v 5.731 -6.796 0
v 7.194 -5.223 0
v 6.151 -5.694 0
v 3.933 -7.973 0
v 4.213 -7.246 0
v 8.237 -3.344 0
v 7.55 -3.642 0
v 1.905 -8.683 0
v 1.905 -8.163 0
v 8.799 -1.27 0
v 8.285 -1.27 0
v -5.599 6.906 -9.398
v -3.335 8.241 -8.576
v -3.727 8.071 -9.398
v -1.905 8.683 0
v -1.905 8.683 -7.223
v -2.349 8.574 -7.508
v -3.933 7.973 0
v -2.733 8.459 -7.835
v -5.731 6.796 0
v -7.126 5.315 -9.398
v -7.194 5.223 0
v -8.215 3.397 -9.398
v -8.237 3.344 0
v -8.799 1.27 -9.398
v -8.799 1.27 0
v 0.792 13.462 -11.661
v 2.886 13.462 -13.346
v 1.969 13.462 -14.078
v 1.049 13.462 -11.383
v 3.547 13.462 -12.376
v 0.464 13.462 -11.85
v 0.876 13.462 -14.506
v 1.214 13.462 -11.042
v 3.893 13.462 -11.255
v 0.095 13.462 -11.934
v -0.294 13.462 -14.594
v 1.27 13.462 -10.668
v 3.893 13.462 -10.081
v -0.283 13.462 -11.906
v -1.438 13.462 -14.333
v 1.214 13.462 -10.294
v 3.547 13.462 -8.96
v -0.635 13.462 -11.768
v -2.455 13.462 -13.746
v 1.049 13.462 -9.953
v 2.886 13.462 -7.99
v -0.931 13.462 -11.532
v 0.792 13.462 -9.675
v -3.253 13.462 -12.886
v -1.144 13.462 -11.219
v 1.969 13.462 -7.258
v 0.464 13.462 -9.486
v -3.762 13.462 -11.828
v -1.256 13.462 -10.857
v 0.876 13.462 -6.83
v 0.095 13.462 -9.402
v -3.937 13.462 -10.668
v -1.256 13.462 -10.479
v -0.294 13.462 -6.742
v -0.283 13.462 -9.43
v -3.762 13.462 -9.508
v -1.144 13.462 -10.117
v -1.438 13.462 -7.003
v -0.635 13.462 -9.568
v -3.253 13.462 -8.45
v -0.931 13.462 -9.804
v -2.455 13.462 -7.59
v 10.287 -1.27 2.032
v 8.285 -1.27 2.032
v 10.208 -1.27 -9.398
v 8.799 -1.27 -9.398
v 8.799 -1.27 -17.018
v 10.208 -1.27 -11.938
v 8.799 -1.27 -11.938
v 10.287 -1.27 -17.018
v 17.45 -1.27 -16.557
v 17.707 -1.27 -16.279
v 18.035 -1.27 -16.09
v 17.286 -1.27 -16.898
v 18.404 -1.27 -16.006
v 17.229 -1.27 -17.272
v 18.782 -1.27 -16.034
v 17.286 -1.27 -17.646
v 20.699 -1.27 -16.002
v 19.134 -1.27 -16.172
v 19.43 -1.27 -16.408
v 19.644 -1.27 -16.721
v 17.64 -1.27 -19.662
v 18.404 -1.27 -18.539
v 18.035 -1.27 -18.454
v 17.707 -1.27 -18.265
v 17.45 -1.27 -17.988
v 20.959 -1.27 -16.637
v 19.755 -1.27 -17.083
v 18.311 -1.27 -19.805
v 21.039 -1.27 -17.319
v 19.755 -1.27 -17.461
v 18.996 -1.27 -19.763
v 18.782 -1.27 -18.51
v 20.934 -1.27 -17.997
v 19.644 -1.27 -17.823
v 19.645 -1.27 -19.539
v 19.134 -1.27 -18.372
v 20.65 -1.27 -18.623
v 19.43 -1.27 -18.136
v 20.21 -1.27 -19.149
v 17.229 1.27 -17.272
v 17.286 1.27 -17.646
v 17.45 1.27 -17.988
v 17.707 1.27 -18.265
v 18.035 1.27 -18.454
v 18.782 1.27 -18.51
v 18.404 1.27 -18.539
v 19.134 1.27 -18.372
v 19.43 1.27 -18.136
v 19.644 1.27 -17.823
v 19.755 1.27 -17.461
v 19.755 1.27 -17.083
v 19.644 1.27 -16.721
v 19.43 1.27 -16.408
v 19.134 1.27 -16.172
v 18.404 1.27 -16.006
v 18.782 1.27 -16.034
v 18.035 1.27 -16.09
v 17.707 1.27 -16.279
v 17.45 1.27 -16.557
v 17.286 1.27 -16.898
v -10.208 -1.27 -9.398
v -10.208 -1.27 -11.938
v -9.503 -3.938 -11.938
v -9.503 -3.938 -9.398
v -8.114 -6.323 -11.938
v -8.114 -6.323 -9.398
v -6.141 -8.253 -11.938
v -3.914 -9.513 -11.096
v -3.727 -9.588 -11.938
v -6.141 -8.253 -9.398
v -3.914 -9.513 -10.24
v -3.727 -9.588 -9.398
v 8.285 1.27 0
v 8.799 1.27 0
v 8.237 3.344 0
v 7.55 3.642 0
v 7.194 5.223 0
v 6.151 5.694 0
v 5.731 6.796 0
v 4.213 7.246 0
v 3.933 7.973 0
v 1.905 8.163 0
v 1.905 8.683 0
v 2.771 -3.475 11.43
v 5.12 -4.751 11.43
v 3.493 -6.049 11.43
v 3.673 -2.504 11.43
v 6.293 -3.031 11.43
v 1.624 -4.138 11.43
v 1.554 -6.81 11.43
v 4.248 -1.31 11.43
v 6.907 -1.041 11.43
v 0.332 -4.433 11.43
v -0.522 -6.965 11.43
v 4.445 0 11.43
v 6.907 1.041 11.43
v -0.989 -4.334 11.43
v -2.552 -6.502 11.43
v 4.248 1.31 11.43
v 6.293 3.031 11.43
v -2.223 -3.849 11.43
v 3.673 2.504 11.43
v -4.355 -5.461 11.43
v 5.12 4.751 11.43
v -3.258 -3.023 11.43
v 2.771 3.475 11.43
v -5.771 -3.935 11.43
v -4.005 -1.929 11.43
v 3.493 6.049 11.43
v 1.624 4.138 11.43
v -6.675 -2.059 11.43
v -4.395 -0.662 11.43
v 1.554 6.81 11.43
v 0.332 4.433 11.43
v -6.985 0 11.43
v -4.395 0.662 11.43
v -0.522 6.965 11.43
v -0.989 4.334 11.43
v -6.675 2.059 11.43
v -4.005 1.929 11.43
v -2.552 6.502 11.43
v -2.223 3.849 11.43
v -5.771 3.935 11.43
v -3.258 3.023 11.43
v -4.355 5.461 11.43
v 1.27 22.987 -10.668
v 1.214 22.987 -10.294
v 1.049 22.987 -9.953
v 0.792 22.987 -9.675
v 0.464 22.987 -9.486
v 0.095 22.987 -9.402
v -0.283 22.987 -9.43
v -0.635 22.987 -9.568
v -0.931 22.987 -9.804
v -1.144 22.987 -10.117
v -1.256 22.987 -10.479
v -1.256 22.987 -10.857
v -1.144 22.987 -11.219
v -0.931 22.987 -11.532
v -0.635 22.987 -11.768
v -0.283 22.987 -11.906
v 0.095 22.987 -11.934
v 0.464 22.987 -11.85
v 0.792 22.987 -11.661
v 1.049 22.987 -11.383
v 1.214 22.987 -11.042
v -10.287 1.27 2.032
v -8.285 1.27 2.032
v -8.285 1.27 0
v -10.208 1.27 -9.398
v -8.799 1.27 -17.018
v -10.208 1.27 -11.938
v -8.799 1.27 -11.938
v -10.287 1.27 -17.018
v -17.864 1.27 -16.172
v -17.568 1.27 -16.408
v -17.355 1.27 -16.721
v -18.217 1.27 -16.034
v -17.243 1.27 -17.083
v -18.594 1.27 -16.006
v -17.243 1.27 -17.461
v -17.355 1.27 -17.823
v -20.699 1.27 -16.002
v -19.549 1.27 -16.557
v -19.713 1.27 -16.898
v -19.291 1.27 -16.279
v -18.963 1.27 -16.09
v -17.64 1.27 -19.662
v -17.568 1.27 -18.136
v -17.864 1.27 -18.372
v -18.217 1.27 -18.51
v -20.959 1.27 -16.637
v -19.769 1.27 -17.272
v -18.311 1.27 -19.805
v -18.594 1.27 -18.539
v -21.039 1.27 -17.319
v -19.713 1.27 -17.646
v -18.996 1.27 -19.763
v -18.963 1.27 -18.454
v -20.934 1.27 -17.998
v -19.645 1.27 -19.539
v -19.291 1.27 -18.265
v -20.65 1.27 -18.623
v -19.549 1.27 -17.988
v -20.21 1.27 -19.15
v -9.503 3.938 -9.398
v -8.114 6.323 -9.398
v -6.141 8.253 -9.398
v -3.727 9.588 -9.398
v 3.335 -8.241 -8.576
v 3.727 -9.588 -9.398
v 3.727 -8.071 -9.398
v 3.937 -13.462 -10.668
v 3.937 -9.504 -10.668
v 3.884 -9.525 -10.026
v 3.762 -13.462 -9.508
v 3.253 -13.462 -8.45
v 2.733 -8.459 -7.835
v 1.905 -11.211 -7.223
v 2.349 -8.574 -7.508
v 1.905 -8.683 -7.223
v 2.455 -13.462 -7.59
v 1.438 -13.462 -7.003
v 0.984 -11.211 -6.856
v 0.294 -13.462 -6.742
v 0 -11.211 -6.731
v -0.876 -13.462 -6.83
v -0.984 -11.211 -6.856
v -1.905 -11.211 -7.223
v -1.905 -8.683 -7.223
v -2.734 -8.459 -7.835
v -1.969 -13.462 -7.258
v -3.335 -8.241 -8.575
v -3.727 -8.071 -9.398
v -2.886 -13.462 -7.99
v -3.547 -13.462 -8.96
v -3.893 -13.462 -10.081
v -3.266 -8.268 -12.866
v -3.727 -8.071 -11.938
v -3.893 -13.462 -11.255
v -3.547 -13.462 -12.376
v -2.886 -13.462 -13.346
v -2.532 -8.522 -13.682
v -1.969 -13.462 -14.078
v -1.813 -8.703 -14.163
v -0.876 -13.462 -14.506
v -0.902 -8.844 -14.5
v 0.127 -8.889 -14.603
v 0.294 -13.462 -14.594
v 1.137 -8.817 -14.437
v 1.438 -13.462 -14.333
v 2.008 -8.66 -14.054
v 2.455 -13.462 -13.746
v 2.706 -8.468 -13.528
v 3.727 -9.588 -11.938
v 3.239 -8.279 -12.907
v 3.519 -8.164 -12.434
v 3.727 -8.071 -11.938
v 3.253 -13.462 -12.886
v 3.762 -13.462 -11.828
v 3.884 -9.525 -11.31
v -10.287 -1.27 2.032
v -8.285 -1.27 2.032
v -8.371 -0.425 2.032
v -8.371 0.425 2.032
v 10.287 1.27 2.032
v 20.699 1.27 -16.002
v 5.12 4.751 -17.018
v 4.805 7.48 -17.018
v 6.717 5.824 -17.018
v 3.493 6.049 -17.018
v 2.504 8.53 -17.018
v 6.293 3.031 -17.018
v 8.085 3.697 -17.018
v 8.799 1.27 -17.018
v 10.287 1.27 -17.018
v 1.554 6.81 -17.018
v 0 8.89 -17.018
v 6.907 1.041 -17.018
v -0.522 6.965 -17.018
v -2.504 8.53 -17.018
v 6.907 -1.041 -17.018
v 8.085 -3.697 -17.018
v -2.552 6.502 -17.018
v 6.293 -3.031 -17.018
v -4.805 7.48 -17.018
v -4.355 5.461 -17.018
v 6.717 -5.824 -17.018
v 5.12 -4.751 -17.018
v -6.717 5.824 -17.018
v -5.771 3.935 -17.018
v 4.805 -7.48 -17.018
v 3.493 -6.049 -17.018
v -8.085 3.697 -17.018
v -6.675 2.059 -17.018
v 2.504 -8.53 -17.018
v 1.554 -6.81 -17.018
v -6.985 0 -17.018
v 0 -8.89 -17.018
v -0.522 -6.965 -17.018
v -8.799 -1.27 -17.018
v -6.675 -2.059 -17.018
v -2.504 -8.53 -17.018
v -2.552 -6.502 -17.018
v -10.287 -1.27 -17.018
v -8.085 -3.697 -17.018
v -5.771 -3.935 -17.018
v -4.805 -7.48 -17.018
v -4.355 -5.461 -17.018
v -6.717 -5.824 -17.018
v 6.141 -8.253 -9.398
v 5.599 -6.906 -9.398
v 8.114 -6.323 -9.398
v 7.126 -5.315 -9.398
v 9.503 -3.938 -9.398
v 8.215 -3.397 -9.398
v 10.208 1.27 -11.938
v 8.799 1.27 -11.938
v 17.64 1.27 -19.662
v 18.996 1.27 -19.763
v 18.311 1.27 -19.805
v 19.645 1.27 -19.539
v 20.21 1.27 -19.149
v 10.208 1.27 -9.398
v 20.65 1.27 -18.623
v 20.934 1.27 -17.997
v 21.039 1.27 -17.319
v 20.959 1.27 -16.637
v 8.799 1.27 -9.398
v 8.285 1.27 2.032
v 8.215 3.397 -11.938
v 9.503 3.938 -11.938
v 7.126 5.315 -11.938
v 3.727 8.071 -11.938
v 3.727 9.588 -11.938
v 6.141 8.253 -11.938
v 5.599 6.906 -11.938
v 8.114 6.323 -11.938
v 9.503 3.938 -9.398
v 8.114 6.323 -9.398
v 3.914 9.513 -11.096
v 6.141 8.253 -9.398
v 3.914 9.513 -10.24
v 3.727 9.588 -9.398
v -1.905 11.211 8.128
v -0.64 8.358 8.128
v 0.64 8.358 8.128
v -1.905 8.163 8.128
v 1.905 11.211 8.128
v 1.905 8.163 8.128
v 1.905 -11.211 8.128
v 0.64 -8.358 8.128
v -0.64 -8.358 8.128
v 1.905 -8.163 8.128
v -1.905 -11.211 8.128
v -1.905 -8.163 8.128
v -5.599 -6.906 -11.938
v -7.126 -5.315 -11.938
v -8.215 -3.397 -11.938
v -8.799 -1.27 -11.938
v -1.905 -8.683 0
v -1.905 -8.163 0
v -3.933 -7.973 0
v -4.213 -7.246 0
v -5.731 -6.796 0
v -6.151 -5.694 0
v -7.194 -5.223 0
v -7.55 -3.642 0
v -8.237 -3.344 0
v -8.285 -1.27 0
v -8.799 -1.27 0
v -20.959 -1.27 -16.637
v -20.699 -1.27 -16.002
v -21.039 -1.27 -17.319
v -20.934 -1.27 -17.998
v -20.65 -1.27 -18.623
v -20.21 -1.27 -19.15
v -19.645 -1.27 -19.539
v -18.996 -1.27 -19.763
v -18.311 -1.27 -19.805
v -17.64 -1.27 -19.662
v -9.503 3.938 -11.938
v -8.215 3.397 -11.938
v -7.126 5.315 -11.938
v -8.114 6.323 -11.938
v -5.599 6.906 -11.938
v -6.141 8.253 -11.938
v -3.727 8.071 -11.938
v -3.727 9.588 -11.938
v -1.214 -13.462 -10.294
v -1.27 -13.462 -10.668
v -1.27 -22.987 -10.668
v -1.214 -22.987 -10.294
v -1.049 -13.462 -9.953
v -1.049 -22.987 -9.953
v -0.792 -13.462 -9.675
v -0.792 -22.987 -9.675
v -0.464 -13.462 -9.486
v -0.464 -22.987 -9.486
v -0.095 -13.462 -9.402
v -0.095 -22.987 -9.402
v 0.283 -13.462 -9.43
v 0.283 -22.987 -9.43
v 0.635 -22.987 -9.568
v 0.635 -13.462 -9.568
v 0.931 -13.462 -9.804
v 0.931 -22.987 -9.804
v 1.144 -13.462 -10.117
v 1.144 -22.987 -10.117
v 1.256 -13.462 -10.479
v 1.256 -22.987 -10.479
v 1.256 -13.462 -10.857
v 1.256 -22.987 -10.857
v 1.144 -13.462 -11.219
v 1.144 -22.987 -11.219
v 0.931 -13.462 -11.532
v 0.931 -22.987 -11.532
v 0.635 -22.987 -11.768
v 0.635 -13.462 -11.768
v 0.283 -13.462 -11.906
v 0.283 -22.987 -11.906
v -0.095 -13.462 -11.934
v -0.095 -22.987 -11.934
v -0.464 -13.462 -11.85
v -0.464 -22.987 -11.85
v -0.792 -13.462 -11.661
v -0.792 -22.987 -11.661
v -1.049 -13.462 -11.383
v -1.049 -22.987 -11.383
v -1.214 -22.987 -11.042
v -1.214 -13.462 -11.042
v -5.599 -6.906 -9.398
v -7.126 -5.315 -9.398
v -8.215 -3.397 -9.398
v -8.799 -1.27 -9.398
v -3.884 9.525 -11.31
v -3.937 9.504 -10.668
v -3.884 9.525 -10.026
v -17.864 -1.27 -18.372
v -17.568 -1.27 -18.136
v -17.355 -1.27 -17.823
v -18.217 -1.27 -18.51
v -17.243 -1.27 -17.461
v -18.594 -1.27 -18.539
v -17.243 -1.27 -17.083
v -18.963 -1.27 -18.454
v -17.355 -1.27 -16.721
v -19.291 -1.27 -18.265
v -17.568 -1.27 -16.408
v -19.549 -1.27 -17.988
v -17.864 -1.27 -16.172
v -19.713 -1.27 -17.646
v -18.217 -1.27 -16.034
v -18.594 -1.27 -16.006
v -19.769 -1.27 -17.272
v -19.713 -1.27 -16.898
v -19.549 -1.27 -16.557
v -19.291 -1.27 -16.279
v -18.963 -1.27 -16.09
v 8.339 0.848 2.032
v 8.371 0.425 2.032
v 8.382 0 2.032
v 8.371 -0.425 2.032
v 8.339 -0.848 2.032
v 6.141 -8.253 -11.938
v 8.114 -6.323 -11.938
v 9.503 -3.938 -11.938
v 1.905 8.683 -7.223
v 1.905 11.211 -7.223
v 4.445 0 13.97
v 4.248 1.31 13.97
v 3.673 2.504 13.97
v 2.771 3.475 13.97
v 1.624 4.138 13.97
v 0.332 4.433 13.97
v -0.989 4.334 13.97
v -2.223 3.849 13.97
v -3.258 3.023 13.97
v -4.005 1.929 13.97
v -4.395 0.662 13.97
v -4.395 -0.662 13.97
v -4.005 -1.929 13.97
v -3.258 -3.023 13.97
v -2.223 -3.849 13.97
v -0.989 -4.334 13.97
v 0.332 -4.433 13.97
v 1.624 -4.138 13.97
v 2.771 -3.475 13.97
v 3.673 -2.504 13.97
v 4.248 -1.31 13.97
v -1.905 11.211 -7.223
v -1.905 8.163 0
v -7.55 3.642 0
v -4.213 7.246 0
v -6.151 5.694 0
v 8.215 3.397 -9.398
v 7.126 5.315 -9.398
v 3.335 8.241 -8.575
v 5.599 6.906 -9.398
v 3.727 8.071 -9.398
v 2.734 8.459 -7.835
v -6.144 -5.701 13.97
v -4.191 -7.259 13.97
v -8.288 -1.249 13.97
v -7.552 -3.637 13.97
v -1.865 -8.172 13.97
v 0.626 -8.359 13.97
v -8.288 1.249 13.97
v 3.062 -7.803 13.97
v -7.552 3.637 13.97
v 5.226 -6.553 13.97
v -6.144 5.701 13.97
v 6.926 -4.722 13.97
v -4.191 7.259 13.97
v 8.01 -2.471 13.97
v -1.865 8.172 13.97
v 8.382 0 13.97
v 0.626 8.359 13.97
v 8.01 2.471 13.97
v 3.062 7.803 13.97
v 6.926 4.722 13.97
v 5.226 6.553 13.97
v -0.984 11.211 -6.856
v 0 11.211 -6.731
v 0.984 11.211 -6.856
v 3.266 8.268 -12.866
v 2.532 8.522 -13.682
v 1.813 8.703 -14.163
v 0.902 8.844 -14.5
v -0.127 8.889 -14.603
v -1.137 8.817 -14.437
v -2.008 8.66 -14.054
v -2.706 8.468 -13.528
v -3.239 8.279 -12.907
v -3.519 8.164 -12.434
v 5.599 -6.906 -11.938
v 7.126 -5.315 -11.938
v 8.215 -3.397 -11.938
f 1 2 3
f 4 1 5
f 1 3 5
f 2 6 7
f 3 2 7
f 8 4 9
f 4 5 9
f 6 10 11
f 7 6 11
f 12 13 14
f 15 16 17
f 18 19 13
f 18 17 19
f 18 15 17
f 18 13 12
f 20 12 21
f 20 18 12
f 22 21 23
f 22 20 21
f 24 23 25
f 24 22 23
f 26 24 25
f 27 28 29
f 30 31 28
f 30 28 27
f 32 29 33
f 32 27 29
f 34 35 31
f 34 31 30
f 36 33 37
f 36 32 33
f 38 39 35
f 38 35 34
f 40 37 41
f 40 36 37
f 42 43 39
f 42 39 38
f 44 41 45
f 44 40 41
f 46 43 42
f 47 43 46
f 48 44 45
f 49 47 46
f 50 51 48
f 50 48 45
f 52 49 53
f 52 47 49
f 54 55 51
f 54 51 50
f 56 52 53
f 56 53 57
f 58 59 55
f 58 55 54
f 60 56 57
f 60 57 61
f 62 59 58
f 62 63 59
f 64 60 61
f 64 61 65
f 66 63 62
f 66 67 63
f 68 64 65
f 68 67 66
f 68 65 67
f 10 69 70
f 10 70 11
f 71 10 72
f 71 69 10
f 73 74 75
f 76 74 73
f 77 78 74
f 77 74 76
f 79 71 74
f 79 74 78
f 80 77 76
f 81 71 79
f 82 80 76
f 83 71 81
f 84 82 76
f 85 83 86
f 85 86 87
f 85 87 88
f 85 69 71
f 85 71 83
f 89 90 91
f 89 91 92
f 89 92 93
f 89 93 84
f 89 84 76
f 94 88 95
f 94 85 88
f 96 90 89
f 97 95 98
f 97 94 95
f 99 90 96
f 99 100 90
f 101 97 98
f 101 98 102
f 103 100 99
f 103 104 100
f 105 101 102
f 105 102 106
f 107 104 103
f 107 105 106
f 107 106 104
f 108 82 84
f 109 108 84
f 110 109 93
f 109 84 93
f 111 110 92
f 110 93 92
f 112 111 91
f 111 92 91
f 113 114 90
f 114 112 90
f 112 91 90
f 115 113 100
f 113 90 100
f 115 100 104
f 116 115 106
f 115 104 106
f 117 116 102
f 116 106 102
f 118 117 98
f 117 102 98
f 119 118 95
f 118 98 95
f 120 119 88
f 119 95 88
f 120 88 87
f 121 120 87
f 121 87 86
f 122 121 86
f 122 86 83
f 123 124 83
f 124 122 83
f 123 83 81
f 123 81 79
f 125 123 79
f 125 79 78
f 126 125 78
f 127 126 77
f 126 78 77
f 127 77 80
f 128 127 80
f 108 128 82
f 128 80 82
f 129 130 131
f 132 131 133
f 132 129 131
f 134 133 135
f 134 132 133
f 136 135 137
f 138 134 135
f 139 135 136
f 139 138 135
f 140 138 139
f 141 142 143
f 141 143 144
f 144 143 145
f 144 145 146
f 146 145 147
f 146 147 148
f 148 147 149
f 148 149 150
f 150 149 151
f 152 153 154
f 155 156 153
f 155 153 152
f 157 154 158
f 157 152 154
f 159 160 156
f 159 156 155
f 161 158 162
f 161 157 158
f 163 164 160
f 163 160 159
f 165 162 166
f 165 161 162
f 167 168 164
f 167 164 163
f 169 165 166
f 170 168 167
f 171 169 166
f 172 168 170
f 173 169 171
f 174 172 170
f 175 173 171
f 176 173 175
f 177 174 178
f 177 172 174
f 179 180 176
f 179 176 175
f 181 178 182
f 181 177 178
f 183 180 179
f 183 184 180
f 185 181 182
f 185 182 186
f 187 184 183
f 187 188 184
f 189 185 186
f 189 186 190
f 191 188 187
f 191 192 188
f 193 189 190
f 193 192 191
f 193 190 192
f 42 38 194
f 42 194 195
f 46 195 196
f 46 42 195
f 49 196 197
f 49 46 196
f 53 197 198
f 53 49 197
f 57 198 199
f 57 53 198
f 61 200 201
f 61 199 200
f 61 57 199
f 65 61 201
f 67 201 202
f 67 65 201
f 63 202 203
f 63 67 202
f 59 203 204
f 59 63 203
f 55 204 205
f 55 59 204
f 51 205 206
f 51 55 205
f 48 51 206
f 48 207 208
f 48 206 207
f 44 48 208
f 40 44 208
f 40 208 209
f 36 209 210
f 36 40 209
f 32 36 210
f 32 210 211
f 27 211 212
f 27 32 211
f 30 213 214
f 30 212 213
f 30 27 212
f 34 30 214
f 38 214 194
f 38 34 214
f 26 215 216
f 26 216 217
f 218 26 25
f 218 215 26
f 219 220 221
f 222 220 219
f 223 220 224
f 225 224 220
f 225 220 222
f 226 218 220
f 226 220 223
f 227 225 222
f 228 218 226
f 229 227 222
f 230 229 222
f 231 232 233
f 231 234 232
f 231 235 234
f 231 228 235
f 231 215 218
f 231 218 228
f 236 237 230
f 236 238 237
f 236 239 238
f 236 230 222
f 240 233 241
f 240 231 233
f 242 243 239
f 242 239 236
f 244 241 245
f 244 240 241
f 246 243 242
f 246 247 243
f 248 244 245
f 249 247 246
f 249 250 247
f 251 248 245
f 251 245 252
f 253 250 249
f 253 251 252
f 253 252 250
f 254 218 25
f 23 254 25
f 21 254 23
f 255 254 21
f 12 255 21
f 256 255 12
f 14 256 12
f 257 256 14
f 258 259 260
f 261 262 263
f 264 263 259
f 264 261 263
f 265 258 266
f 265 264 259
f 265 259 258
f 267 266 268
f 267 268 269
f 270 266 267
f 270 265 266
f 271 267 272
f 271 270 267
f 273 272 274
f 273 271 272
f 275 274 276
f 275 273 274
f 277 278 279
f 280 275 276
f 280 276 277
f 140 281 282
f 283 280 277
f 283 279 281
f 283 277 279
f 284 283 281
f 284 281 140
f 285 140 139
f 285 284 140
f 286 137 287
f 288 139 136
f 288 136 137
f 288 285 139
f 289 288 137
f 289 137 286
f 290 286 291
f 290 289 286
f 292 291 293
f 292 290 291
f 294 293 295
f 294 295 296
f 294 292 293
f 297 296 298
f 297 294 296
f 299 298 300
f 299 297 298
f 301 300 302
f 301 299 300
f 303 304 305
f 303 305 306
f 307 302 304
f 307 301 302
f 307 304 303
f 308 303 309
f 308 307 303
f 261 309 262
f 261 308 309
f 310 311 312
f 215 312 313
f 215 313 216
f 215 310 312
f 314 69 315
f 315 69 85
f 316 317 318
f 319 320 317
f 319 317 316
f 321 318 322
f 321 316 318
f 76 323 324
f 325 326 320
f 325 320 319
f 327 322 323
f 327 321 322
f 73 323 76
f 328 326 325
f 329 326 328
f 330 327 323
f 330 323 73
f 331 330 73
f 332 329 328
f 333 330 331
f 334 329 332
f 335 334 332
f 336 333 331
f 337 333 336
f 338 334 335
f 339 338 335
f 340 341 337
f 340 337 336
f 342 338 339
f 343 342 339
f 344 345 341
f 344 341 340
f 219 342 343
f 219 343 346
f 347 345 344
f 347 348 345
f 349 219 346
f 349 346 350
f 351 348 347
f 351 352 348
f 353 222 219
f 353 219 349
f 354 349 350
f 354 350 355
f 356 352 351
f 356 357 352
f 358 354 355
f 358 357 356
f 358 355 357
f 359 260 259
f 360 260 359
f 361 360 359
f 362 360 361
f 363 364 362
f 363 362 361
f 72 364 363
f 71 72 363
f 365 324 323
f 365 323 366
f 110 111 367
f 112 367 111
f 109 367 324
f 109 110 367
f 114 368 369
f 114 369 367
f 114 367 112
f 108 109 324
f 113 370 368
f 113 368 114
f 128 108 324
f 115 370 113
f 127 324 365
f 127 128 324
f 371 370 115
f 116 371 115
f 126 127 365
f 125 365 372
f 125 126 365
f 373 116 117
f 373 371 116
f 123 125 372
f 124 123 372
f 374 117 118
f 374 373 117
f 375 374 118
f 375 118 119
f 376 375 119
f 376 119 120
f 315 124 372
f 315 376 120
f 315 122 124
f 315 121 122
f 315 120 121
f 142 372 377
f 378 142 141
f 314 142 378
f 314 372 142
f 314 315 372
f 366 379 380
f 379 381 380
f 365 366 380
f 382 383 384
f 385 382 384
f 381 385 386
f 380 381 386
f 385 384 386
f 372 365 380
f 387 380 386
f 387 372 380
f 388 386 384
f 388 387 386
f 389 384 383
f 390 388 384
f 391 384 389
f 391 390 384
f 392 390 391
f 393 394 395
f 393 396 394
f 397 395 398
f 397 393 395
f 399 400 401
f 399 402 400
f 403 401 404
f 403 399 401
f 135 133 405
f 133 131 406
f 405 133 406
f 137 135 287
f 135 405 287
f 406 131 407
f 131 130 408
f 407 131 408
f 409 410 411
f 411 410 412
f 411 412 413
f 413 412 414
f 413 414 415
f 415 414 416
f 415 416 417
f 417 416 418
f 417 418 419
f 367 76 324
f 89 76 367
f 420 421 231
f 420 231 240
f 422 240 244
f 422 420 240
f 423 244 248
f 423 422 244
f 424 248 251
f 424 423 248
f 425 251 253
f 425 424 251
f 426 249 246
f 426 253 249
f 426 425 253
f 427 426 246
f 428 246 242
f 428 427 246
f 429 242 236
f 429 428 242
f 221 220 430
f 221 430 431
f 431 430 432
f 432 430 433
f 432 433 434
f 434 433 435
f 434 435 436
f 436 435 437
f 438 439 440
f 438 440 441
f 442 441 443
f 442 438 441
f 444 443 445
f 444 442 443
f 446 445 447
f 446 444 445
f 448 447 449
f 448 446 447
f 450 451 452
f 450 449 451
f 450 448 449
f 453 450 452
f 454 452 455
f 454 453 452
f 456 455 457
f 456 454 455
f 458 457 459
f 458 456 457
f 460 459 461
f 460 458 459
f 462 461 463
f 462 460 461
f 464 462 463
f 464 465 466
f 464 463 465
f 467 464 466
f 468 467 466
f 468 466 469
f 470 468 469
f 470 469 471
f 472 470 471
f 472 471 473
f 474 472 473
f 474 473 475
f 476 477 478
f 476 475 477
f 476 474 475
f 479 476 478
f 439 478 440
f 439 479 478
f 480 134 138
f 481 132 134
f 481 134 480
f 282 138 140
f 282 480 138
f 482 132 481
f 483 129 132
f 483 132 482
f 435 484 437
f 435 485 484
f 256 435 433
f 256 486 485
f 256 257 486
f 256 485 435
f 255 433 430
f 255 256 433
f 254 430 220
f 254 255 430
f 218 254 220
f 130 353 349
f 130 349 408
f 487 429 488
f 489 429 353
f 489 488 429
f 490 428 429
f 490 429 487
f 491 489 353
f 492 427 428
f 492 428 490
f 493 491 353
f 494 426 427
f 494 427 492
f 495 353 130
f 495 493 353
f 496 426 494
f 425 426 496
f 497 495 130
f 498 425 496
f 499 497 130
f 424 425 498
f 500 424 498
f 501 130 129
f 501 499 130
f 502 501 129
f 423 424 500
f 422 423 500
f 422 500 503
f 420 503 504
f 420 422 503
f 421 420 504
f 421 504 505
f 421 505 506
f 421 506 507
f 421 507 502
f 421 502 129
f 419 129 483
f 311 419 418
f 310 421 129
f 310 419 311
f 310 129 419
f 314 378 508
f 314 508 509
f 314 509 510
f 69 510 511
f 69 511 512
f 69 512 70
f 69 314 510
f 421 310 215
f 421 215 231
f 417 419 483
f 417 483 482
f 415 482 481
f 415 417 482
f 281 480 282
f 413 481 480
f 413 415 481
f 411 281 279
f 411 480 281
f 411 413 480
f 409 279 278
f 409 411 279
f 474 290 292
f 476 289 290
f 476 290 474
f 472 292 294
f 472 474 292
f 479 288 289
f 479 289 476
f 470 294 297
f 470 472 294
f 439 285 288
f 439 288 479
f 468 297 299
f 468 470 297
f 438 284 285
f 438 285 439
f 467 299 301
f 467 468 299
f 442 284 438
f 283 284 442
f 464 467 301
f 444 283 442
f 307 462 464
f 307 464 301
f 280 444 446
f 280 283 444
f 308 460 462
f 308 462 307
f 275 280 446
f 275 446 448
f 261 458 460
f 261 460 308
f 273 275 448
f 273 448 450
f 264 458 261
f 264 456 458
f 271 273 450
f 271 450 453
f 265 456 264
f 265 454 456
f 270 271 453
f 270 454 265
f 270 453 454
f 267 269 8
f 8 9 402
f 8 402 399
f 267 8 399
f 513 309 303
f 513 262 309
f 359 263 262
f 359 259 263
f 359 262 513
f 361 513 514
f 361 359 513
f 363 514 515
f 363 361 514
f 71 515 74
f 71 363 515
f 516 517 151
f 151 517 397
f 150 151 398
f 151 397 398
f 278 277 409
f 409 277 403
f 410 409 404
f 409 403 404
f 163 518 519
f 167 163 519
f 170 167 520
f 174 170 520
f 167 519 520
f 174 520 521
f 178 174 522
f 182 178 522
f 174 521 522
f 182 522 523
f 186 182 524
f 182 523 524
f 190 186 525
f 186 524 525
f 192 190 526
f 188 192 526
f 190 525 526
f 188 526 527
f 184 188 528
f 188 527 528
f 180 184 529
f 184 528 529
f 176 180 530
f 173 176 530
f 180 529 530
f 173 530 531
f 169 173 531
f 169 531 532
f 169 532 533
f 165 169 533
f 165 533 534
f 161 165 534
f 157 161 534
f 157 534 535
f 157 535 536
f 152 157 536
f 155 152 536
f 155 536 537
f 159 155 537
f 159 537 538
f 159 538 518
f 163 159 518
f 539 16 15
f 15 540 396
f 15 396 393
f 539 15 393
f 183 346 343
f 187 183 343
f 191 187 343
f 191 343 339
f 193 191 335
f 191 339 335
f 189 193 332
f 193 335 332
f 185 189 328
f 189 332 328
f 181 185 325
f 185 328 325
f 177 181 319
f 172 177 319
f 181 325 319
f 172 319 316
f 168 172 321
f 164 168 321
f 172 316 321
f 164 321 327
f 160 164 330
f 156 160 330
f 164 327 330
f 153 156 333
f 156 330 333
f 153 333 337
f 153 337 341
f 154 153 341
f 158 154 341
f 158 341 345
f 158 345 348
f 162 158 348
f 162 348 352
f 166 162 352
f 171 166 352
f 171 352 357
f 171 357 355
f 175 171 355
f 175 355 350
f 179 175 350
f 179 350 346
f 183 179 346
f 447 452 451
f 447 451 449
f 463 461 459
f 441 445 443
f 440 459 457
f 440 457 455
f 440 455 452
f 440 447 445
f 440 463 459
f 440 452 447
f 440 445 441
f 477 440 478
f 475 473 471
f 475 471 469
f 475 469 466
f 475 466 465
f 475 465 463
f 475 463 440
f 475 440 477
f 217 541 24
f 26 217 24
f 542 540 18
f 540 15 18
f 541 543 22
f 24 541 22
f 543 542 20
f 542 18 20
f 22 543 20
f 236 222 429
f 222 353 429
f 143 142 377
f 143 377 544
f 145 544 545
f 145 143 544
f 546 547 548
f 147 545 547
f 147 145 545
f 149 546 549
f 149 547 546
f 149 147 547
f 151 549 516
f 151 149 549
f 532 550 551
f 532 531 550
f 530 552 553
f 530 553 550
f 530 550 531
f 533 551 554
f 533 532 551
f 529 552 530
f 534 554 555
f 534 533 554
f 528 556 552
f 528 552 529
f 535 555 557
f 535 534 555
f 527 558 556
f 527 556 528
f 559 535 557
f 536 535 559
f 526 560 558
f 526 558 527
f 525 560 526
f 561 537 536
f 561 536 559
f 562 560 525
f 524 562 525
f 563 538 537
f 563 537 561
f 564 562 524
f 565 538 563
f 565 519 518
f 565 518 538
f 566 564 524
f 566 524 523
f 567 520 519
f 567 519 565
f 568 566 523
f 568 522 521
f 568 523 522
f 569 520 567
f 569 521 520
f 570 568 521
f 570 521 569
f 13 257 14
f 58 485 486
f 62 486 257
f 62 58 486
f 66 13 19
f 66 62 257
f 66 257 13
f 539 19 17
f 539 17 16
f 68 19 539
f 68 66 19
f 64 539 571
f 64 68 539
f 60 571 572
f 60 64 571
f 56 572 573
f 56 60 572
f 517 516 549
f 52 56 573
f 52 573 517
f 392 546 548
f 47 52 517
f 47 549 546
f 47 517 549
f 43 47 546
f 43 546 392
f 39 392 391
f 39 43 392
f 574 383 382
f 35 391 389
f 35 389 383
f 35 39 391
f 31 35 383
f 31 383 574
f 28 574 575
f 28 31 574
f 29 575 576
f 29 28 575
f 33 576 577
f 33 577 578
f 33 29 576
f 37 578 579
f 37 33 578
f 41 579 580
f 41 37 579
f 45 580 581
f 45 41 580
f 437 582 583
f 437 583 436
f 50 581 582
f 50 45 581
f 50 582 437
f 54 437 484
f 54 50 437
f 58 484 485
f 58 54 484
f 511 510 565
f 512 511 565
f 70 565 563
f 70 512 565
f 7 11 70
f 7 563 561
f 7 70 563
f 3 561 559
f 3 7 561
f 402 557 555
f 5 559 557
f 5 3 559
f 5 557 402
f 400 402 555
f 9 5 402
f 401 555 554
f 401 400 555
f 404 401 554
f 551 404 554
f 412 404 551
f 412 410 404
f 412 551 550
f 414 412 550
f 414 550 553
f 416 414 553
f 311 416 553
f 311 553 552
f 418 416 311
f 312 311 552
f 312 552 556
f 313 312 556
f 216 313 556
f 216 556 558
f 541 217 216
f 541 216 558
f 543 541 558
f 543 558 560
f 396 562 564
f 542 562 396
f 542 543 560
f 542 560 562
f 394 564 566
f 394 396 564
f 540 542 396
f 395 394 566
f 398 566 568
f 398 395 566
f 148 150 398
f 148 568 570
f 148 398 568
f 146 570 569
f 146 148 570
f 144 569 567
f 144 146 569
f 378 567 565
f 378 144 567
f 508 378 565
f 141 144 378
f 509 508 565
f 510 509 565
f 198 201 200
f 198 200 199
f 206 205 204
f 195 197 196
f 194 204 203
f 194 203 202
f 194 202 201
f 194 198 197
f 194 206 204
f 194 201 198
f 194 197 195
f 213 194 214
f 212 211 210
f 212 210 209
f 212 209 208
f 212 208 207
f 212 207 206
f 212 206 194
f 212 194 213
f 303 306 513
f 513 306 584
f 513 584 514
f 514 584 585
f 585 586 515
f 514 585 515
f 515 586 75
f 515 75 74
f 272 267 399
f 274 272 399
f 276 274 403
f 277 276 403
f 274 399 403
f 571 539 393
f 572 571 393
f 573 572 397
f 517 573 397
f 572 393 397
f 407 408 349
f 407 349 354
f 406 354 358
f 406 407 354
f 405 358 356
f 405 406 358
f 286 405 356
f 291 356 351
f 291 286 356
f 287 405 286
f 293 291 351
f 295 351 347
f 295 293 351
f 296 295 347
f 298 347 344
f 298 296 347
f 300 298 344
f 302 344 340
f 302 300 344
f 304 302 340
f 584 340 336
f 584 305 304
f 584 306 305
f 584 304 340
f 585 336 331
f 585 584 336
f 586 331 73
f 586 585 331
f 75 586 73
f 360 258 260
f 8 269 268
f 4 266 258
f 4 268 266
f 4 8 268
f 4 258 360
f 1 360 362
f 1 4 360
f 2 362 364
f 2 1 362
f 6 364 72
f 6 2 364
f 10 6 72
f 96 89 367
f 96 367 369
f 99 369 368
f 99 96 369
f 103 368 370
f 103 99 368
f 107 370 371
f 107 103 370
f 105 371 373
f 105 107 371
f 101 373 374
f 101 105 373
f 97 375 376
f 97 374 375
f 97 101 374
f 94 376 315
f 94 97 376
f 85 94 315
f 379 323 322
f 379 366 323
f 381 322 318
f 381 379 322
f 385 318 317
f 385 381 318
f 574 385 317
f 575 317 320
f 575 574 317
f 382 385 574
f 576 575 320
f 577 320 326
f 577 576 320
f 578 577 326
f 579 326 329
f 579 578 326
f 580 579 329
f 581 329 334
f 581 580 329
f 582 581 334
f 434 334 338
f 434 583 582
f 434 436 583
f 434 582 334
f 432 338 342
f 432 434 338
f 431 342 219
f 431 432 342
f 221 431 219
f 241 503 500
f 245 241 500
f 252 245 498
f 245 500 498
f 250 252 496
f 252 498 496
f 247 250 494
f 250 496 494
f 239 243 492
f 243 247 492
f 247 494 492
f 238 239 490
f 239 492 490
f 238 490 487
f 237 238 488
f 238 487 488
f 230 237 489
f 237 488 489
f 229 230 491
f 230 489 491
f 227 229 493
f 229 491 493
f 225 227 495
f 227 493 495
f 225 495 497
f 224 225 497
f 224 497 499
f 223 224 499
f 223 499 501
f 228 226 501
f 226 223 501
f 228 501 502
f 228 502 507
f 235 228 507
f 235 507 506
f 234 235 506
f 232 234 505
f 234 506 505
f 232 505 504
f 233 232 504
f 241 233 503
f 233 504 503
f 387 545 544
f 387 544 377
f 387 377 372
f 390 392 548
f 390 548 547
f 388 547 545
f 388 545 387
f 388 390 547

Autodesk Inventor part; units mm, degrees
sketch "Sketch2" plane through (0, 0, 0) normal (0, 0, 1) x (1, 0, 0)
  circle A0 centre (0, 0) radius 8.382
  dimension "d0" = 16.764
extrude "Extrusion1" add sketch "Sketch2" along normal blind 13.97
sketch "Sketch3" plane through (0, 0, 0) normal (0, 0, -1) x (-1, 0, 0)
  circle A0 centre (0, 0) radius 8.382 projected
  circle A1 centre (0, 0) radius 8.89
  dimension "d3" = 17.78
extrude "Extrusion2" add sketch "Sketch3" along normal blind 17.018 contours A0 | A1
ref_plane "Work Plane1" through (0, 0, -9.398) normal (0, 0, 1) x (1, 0, 0)
sketch "Sketch4" plane through (0, 0, -9.398) normal (0, 0, 1) x (1, 0, 0)
  circle A0 centre (0, 0) radius 8.89
  circle A1 centre (0, 0) radius 10.287
  circle A2 centre (0, 0) radius 8.89 projected
  dimension "d7" = 20.574
extrude "Extrusion3" add sketch "Sketch4" against normal blind 2.54
ref_plane "Work Plane6" through (0, 13.462, 0) normal (0, 1, 0) x (-1, 0, 0)
ref_plane "Work Plane5" through (0, 8.89, 0) normal (0, 1, 0) x (-1, 0, 0)
sketch "Sketch6" plane through (0, 13.462, 0) normal (0, 1, 0) x (-1, 0, 0)
  circle A0 centre (0, -10.668) radius 3.937
  line L0 (-9.4933, -9.398) -> (9.4933, -9.398) projected
  line L1 (9.4933, -11.938) -> (-9.4933, -11.938) projected
  line L2 (0, -24.5018) -> (0, -30.8914) construction
  point P0 (0, 0)
  dimension "d16" = 7.874
  dimension "d17" = 1.27
extrude "Extrusion4" add sketch "Sketch6" against normal up to surface
ref_plane "Work Plane7" through (0, 0, 8.128) normal (0, 0, 1) x (1, 0, 0)
sketch "Sketch7" plane through (0, 0, 8.128) normal (0, 0, 1) x (1, 0, 0)
  circle A0 centre (0, 0) radius 8.382 projected
  line L0 (-1.905, 8.1627) -> (-1.905, 11.2107)
  line L1 (-1.905, 11.2107) -> (1.905, 11.2107)
  line L2 (1.905, 11.2107) -> (1.905, 8.1627)
  arc A1 (1.905, 8.1627) -> (-1.905, 8.1627) centre (0, 0) ccw
  dimension "d25" = 16.764
  dimension "d26" = 3.81
  dimension "d27" = 3.048
  dimension "d28" = 1.905
extrude "Extrusion5" add sketch "Sketch7" against normal up to surface contours A0 L0 L1 L2
pattern_circular "Circular Pattern1" count 2 over 360 about axis through (0, 0, 0) along (0, 0, 1) of "Extrusion4", "Extrusion5"
sketch "Sketch8" plane through (0, 13.462, -10.668) normal (0, 1, 0) x (1, 0, 0)
  circle A0 centre (0, 0) radius 3.937 projected
  circle A1 centre (0, 0) radius 1.27
  point P0 (0, -10.668)
  dimension "d34" = 2.54
extrude "Extrusion6" add sketch "Sketch8" along normal blind 9.525 contours A1
pattern_circular "Circular Pattern2" count 2 over 360 about axis through (0, 0, 0) along (0, 0, 1) of "Extrusion6"
sketch "Sketch9" plane through (0, 0, -17.018) normal (0, 0, -1) x (-1, 0, 0)
  circle A0 centre (0, 0) radius 8.89 projected
  circle A1 centre (0, 0) radius 6.985
  dimension "d40" = 13.97
extrude "Extrusion7" cut sketch "Sketch9" against normal blind 28.448 contours A1
sketch "Sketch10" plane through (0, 0, 13.97) normal (0, 0, 1) x (1, 0, 0)
  circle A0 centre (0, 0) radius 8.382 projected
  circle A1 centre (0, 0) radius 4.445
  dimension "d43" = 8.89
extrude "Extrusion8" cut sketch "Sketch10" against normal up to surface (2.54 mm away) contours A1
sketch "Sketch12" plane through (0, 0, 0) normal (0, 1, 0) x (-1, 0, 0)
  line L0 (-10.287, -17.018) -> (-10.287, 2.032)
  circle A0 centre (-18.4993, -17.2721) radius 1.27
  arc A1 (-20.699, -16.0021) -> (-17.6397, -19.6623) centre (-18.4993, -17.2721) ccw
  line L1 (-10.287, 2.032) -> (-20.699, -16.0021)
  line L2 (-10.287, -17.018) -> (-17.6397, -19.6623)
  line L3 (8.89, -17.018) -> (-8.89, -17.018) projected
  line L4 (-10.287, -9.398) -> (-10.287, -11.938) projected
  line L5 (0, -20.2977) -> (0, -33.1857) construction
  line L6 (10.287, -17.018) -> (10.287, 2.032)
  circle A2 centre (18.4993, -17.2721) radius 1.27
  arc A3 (17.6397, -19.6623) -> (20.699, -16.0021) centre (18.4993, -17.2721) ccw
  line L7 (10.287, 2.032) -> (20.699, -16.0021)
  line L8 (10.287, -17.018) -> (17.6397, -19.6623)
  line L9 (10.287, -9.398) -> (10.287, -11.938)
  point P0 (0, 0)
  dimension "d46" = 2.54
  dimension "d47" = 5.08
  dimension "d48" = 30
  dimension "d49" = 19.05
extrude "Extrusion9" add sketch "Sketch12" along normal mid plane 2.54
sketch "Sketch13" plane through (10.287, -1.27, -17.018) normal (-1, 0, 0) x (0, 0, 1)
  line L0 (0, 2.54) -> (19.05, 2.54)
  line L1 (19.05, 2.54) -> (19.05, 0)
  line L2 (19.05, 0) -> (0, 0)
  line L3 (0, 0) -> (0, 2.54)
  point P0 (17.018, 1.27)
extrude "Extrusion10" add sketch "Sketch13" along normal up to surface
mirror "Mirror1" about plane through (0, 0, 0) normal (1, 0, 0) of "Extrusion10"
properties part number "Axle Body - Front - Custom"
